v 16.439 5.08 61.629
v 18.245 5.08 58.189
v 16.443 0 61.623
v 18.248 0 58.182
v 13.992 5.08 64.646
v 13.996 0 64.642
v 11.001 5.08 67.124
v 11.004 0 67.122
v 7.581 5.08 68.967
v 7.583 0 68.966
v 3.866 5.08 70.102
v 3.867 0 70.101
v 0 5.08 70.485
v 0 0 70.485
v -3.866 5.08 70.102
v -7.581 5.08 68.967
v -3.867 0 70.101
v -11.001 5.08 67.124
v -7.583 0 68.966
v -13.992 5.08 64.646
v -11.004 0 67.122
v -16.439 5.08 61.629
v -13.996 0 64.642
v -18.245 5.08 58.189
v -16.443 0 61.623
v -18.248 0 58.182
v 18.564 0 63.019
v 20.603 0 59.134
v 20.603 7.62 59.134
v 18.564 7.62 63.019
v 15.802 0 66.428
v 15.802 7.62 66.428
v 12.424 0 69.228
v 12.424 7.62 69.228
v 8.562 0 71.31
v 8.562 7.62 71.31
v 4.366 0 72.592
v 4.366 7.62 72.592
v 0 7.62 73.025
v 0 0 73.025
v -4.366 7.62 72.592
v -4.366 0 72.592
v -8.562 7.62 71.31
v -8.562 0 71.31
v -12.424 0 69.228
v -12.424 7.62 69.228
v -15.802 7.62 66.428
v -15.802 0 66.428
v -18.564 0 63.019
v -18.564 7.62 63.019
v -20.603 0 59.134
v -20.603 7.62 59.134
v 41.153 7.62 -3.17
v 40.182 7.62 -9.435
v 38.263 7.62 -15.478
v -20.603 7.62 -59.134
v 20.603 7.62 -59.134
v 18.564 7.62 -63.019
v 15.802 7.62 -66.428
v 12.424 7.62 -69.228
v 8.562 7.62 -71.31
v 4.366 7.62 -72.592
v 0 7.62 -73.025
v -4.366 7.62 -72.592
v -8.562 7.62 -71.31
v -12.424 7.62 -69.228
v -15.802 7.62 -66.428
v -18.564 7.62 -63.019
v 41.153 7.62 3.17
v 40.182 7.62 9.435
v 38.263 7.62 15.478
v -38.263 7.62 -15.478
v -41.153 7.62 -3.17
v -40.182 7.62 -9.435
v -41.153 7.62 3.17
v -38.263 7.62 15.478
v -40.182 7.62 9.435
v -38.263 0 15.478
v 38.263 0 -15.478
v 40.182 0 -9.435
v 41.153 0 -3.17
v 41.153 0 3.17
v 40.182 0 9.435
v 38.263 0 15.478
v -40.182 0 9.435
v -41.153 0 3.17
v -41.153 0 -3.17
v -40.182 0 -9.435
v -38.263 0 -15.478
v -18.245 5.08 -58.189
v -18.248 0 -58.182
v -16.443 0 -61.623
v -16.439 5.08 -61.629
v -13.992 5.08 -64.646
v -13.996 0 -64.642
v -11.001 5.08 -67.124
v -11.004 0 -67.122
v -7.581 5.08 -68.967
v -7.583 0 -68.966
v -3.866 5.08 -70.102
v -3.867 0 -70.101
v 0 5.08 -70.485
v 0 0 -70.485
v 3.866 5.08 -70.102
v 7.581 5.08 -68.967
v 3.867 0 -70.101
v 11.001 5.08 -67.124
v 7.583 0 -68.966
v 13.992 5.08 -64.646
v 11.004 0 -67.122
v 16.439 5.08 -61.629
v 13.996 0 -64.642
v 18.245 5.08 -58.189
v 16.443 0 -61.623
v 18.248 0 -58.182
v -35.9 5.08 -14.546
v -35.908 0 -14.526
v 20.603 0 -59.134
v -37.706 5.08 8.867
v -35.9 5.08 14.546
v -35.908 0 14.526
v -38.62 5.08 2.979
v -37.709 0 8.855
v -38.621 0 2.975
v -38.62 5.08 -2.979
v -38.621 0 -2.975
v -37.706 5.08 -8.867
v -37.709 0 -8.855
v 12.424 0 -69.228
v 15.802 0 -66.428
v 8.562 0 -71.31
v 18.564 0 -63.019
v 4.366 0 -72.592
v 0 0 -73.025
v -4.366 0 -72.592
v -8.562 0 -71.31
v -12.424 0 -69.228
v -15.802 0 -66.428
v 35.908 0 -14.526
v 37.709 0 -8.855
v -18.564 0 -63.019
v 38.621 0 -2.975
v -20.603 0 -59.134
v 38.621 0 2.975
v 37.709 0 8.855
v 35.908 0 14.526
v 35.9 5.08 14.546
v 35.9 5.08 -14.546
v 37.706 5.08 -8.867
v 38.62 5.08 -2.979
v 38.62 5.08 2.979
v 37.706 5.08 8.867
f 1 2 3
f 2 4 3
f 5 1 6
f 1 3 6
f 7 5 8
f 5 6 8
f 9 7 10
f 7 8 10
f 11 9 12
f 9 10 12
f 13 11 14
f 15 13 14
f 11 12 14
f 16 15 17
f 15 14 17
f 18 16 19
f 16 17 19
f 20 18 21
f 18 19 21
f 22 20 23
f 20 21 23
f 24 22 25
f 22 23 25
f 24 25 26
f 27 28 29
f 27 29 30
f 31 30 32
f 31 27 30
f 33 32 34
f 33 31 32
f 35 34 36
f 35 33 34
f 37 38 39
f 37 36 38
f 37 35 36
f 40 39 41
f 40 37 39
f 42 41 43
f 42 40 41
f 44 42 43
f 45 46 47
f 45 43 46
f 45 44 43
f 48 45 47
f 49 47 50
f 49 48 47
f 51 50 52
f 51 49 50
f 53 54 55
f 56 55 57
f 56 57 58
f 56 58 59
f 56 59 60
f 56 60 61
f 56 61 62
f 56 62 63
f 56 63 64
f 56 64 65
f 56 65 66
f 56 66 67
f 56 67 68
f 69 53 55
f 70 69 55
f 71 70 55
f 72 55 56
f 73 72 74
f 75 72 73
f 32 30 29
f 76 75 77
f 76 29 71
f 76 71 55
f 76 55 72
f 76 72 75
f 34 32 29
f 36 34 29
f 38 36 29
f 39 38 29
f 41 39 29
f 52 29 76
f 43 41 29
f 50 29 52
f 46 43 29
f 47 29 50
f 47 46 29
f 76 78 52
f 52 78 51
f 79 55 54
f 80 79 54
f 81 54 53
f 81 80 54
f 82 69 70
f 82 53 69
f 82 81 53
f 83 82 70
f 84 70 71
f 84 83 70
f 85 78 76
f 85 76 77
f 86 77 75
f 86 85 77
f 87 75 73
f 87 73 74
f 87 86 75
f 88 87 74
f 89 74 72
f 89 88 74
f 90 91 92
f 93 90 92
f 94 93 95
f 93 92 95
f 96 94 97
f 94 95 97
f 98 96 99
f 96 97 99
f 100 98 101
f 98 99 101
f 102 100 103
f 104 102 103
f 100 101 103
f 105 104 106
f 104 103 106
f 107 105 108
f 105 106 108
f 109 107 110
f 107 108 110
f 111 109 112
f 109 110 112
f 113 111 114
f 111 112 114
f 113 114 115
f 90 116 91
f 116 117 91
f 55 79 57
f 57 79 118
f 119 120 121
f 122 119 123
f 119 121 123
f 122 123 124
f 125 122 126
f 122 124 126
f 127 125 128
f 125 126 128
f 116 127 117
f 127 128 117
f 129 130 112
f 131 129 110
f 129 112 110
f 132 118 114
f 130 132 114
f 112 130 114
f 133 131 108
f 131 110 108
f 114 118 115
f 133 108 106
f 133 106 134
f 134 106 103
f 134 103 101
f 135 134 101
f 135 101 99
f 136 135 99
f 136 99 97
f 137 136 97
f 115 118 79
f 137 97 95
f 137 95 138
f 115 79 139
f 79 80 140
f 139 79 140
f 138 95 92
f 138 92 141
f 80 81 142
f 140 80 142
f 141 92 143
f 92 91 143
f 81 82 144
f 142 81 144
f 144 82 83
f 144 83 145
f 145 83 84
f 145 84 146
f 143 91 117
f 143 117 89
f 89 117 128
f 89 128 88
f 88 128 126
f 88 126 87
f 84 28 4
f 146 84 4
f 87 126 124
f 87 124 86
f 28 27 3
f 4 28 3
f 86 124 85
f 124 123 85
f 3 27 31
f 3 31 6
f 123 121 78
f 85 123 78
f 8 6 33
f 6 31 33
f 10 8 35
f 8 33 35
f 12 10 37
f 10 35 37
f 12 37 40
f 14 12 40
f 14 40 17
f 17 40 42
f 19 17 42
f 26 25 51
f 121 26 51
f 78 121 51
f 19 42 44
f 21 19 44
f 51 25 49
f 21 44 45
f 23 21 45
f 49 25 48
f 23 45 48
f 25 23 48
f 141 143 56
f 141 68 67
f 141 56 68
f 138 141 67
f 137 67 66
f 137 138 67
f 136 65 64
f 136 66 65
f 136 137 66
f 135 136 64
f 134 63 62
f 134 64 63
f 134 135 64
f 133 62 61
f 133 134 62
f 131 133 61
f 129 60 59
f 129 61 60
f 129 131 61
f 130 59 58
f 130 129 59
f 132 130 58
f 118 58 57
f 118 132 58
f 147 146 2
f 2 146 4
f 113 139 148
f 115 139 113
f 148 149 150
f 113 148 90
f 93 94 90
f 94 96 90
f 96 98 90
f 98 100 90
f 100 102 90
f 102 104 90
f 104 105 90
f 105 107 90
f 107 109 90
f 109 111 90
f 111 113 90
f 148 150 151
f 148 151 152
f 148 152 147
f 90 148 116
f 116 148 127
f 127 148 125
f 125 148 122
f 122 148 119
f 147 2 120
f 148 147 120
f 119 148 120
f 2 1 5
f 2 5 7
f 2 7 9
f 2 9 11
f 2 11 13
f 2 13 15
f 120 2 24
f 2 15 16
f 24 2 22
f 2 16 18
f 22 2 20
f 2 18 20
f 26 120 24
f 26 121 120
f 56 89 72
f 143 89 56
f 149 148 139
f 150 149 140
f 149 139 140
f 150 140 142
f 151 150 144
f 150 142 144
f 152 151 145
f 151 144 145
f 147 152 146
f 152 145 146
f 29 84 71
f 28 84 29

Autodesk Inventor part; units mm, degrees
ref_plane "YZ Plane" through (0, 0, 0) normal (1, 0, 0) x (0, 1, 0)
ref_plane "XZ Plane" through (0, 0, 0) normal (0, 1, 0) x (-1, 0, 0)
ref_plane "XY Plane" through (0, 0, 0) normal (0, 0, 1) x (1, 0, 0)
sketch "Sketch1" plane through (0, 0, 0) normal (0, 1, 0) x (-1, 0, 0)
  circle A0 centre (0, 0) radius 41.275
  circle A1 centre (0, 50.8) radius 22.225
  circle A2 centre (0, -50.8) radius 22.225
  line L0 (38.2629, 15.4781) -> (20.6031, 59.1344)
  line L1 (-38.2629, 15.4781) -> (-20.6031, 59.1344)
  line L2 (-38.2629, -15.4781) -> (-20.6031, -59.1344)
  line L3 (38.2629, -15.4781) -> (20.6031, -59.1344)
  dimension "d0" = 82.55
  dimension "d1" = 44.45
  dimension "d2" = 44.45
  dimension "d3" = 50.8
  dimension "d4" = 50.8
extrude "Extrusion1" add sketch "Sketch1" along normal blind 7.62
shell "Shell2" thickness 2.54 removed faces 1 at (-6.8677, 0, -30.0302)
properties part number "Diamond-Box-Lid"
